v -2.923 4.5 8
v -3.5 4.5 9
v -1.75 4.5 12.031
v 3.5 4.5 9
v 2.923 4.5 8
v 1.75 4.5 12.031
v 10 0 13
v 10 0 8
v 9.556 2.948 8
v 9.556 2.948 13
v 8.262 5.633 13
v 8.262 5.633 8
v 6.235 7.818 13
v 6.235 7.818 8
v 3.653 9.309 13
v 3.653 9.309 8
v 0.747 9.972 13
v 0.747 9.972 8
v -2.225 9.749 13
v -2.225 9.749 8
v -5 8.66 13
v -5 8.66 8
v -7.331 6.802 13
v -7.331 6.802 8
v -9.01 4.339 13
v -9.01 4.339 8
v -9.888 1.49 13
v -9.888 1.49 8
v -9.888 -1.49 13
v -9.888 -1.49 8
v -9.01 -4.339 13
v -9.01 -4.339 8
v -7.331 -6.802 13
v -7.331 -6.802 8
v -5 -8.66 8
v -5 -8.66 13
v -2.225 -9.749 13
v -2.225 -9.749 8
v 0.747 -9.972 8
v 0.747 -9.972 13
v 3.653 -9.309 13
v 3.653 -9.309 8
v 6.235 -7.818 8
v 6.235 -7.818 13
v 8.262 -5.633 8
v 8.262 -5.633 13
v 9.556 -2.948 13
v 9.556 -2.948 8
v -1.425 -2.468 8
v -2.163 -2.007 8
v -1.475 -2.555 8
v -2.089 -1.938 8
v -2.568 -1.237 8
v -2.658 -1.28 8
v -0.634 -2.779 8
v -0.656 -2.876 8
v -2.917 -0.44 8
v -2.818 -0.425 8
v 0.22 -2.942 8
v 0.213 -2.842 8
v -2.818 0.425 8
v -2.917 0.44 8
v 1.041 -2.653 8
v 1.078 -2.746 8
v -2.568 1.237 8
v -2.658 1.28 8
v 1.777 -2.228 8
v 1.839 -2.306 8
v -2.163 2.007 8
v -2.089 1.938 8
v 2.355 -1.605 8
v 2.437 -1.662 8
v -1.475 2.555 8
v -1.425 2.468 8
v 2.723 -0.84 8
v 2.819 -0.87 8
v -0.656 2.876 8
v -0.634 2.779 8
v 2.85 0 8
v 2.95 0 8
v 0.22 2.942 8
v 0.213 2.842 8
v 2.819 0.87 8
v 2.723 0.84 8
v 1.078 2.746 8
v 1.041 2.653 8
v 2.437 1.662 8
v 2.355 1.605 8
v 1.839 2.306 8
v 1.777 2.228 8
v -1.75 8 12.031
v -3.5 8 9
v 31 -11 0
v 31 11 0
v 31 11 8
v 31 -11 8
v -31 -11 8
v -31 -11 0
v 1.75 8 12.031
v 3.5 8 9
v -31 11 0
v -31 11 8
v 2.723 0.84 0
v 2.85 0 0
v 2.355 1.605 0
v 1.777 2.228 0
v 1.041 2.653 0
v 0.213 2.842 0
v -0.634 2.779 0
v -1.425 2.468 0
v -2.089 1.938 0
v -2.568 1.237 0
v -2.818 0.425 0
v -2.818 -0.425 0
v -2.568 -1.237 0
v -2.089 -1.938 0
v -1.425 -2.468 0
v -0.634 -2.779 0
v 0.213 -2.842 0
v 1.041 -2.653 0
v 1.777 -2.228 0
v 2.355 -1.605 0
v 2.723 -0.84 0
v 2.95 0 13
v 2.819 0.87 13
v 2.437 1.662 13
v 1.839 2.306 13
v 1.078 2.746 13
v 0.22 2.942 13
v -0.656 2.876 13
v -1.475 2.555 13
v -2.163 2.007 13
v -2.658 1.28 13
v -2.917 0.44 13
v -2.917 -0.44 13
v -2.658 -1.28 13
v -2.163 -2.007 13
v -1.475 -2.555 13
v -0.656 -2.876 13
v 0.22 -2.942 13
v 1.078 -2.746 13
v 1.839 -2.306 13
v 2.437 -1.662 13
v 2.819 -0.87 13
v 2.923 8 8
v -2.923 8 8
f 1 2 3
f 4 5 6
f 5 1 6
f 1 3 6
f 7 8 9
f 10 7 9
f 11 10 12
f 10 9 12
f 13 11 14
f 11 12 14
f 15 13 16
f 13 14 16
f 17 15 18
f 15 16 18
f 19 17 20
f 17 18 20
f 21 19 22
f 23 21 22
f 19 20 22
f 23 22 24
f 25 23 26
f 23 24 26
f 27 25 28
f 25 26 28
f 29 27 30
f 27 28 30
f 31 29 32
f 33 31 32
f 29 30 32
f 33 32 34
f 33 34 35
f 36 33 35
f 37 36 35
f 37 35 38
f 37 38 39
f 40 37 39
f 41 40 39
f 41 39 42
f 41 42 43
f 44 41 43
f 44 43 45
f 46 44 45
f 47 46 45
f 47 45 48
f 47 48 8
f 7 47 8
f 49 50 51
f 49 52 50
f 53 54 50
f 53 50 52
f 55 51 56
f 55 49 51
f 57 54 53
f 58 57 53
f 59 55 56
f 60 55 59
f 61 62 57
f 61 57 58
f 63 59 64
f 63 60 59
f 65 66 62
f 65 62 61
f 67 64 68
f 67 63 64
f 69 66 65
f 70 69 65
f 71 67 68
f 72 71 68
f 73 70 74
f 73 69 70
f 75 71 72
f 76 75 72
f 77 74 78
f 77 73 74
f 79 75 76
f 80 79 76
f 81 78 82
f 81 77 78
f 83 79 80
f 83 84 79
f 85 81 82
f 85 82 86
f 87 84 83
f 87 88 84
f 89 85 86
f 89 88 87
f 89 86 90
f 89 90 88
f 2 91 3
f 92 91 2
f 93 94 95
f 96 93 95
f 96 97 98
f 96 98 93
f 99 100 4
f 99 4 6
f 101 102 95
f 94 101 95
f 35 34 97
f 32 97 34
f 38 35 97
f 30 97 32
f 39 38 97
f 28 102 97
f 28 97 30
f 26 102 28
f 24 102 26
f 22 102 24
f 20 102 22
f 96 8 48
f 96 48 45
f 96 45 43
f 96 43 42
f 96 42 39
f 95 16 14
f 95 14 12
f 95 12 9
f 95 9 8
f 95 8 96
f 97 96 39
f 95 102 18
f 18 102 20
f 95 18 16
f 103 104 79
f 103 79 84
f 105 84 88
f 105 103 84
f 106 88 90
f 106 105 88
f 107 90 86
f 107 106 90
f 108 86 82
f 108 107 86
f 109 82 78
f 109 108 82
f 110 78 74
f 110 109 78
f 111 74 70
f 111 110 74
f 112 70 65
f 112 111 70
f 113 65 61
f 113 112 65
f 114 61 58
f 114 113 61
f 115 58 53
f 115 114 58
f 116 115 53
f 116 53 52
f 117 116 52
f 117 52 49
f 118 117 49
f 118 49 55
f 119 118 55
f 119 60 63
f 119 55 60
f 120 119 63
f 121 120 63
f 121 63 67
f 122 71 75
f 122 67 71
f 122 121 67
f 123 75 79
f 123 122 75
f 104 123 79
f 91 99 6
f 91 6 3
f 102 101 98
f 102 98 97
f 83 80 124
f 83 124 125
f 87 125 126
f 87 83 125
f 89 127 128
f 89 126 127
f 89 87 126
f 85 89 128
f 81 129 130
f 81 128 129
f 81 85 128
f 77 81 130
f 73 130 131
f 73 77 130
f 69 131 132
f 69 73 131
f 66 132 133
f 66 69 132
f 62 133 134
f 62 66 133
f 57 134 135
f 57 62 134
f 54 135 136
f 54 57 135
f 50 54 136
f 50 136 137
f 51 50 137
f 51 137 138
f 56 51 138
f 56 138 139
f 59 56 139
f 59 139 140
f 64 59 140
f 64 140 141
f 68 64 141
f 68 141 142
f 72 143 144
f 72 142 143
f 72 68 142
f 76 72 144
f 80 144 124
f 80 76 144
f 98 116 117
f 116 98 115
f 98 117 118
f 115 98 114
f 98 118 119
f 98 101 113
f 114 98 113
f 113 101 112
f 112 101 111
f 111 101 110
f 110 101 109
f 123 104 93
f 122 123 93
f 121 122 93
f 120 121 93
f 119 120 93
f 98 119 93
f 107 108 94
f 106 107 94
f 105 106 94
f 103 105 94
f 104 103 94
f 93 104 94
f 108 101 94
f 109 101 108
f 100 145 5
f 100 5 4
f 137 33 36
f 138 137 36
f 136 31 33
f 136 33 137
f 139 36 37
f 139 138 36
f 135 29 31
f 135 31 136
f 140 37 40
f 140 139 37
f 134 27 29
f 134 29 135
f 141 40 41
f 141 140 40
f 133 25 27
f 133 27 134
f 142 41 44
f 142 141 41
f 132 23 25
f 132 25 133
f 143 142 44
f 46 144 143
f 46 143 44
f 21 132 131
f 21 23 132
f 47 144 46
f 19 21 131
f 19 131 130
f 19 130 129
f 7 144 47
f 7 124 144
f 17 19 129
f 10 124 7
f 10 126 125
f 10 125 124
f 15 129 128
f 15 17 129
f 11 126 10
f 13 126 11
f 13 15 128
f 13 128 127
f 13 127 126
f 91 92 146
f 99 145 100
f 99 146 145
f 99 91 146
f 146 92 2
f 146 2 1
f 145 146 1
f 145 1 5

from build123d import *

# Parameters (mm, degrees)
PRISM001_DEPTH    = 3.5
CYLINDER006_R     = 2.95
CYLINDER006_DEPTH = 25
CYLINDER005_R     = 10
CYLINDER005_DEPTH = 13
CYLINDER007_R     = 2.85
CYLINDER007_DEPTH = 25
BOX002_W          = 62
BOX002_H          = 8
BOX002_DEPTH      = 22


with BuildPart() as prisma001:
    # Prism001 → Prism001 (new body)
    with BuildSketch(Plane(origin=(0, 8, 9), x_dir=(1, 0, 0), z_dir=(0, -1, 0))):
        Polygon((3.5, 0), (1.75, 3.031089), (-1.75, 3.031089), (-3.5, 0), (-1.75, -3.031089), (1.75, -3.031089), align=None)
    extrude(amount=PRISM001_DEPTH)


with BuildPart() as cilindro006:
    # Cylinder006 → Cylinder006 (new body)
    with BuildSketch(Plane.XY.offset(-7)):
        Circle(CYLINDER006_R)
    extrude(amount=CYLINDER006_DEPTH)


with BuildPart() as cut006:
    # Cylinder005 → Cylinder005 (new body)
    with BuildSketch(Plane.XY):
        Circle(CYLINDER005_R)
    extrude(amount=CYLINDER005_DEPTH)

    # Cut005: cut Cilindro006
    add(cilindro006.part, mode=Mode.SUBTRACT)

    # Cut006: cut Prisma001
    add(prisma001.part, mode=Mode.SUBTRACT)


with BuildPart() as cilindro007:
    # Cylinder007 → Cylinder007 (new body)
    with BuildSketch(Plane.XY.offset(-7)):
        Circle(CYLINDER007_R)
    extrude(amount=CYLINDER007_DEPTH)


with BuildPart() as fusion:
    # Box002 → Box002 (new body)
    with BuildSketch(Plane(origin=(-31, 11, 0), x_dir=(1, 0, 0), z_dir=(0, -1, 0))):
        with Locations((31, 4)):
            Rectangle(BOX002_W, BOX002_H)
    extrude(amount=BOX002_DEPTH)

    # Cut: cut Cilindro007
    add(cilindro007.part, mode=Mode.SUBTRACT)

    # Fusion: union Cut006
    add(cut006.part)


solid = fusion.part
